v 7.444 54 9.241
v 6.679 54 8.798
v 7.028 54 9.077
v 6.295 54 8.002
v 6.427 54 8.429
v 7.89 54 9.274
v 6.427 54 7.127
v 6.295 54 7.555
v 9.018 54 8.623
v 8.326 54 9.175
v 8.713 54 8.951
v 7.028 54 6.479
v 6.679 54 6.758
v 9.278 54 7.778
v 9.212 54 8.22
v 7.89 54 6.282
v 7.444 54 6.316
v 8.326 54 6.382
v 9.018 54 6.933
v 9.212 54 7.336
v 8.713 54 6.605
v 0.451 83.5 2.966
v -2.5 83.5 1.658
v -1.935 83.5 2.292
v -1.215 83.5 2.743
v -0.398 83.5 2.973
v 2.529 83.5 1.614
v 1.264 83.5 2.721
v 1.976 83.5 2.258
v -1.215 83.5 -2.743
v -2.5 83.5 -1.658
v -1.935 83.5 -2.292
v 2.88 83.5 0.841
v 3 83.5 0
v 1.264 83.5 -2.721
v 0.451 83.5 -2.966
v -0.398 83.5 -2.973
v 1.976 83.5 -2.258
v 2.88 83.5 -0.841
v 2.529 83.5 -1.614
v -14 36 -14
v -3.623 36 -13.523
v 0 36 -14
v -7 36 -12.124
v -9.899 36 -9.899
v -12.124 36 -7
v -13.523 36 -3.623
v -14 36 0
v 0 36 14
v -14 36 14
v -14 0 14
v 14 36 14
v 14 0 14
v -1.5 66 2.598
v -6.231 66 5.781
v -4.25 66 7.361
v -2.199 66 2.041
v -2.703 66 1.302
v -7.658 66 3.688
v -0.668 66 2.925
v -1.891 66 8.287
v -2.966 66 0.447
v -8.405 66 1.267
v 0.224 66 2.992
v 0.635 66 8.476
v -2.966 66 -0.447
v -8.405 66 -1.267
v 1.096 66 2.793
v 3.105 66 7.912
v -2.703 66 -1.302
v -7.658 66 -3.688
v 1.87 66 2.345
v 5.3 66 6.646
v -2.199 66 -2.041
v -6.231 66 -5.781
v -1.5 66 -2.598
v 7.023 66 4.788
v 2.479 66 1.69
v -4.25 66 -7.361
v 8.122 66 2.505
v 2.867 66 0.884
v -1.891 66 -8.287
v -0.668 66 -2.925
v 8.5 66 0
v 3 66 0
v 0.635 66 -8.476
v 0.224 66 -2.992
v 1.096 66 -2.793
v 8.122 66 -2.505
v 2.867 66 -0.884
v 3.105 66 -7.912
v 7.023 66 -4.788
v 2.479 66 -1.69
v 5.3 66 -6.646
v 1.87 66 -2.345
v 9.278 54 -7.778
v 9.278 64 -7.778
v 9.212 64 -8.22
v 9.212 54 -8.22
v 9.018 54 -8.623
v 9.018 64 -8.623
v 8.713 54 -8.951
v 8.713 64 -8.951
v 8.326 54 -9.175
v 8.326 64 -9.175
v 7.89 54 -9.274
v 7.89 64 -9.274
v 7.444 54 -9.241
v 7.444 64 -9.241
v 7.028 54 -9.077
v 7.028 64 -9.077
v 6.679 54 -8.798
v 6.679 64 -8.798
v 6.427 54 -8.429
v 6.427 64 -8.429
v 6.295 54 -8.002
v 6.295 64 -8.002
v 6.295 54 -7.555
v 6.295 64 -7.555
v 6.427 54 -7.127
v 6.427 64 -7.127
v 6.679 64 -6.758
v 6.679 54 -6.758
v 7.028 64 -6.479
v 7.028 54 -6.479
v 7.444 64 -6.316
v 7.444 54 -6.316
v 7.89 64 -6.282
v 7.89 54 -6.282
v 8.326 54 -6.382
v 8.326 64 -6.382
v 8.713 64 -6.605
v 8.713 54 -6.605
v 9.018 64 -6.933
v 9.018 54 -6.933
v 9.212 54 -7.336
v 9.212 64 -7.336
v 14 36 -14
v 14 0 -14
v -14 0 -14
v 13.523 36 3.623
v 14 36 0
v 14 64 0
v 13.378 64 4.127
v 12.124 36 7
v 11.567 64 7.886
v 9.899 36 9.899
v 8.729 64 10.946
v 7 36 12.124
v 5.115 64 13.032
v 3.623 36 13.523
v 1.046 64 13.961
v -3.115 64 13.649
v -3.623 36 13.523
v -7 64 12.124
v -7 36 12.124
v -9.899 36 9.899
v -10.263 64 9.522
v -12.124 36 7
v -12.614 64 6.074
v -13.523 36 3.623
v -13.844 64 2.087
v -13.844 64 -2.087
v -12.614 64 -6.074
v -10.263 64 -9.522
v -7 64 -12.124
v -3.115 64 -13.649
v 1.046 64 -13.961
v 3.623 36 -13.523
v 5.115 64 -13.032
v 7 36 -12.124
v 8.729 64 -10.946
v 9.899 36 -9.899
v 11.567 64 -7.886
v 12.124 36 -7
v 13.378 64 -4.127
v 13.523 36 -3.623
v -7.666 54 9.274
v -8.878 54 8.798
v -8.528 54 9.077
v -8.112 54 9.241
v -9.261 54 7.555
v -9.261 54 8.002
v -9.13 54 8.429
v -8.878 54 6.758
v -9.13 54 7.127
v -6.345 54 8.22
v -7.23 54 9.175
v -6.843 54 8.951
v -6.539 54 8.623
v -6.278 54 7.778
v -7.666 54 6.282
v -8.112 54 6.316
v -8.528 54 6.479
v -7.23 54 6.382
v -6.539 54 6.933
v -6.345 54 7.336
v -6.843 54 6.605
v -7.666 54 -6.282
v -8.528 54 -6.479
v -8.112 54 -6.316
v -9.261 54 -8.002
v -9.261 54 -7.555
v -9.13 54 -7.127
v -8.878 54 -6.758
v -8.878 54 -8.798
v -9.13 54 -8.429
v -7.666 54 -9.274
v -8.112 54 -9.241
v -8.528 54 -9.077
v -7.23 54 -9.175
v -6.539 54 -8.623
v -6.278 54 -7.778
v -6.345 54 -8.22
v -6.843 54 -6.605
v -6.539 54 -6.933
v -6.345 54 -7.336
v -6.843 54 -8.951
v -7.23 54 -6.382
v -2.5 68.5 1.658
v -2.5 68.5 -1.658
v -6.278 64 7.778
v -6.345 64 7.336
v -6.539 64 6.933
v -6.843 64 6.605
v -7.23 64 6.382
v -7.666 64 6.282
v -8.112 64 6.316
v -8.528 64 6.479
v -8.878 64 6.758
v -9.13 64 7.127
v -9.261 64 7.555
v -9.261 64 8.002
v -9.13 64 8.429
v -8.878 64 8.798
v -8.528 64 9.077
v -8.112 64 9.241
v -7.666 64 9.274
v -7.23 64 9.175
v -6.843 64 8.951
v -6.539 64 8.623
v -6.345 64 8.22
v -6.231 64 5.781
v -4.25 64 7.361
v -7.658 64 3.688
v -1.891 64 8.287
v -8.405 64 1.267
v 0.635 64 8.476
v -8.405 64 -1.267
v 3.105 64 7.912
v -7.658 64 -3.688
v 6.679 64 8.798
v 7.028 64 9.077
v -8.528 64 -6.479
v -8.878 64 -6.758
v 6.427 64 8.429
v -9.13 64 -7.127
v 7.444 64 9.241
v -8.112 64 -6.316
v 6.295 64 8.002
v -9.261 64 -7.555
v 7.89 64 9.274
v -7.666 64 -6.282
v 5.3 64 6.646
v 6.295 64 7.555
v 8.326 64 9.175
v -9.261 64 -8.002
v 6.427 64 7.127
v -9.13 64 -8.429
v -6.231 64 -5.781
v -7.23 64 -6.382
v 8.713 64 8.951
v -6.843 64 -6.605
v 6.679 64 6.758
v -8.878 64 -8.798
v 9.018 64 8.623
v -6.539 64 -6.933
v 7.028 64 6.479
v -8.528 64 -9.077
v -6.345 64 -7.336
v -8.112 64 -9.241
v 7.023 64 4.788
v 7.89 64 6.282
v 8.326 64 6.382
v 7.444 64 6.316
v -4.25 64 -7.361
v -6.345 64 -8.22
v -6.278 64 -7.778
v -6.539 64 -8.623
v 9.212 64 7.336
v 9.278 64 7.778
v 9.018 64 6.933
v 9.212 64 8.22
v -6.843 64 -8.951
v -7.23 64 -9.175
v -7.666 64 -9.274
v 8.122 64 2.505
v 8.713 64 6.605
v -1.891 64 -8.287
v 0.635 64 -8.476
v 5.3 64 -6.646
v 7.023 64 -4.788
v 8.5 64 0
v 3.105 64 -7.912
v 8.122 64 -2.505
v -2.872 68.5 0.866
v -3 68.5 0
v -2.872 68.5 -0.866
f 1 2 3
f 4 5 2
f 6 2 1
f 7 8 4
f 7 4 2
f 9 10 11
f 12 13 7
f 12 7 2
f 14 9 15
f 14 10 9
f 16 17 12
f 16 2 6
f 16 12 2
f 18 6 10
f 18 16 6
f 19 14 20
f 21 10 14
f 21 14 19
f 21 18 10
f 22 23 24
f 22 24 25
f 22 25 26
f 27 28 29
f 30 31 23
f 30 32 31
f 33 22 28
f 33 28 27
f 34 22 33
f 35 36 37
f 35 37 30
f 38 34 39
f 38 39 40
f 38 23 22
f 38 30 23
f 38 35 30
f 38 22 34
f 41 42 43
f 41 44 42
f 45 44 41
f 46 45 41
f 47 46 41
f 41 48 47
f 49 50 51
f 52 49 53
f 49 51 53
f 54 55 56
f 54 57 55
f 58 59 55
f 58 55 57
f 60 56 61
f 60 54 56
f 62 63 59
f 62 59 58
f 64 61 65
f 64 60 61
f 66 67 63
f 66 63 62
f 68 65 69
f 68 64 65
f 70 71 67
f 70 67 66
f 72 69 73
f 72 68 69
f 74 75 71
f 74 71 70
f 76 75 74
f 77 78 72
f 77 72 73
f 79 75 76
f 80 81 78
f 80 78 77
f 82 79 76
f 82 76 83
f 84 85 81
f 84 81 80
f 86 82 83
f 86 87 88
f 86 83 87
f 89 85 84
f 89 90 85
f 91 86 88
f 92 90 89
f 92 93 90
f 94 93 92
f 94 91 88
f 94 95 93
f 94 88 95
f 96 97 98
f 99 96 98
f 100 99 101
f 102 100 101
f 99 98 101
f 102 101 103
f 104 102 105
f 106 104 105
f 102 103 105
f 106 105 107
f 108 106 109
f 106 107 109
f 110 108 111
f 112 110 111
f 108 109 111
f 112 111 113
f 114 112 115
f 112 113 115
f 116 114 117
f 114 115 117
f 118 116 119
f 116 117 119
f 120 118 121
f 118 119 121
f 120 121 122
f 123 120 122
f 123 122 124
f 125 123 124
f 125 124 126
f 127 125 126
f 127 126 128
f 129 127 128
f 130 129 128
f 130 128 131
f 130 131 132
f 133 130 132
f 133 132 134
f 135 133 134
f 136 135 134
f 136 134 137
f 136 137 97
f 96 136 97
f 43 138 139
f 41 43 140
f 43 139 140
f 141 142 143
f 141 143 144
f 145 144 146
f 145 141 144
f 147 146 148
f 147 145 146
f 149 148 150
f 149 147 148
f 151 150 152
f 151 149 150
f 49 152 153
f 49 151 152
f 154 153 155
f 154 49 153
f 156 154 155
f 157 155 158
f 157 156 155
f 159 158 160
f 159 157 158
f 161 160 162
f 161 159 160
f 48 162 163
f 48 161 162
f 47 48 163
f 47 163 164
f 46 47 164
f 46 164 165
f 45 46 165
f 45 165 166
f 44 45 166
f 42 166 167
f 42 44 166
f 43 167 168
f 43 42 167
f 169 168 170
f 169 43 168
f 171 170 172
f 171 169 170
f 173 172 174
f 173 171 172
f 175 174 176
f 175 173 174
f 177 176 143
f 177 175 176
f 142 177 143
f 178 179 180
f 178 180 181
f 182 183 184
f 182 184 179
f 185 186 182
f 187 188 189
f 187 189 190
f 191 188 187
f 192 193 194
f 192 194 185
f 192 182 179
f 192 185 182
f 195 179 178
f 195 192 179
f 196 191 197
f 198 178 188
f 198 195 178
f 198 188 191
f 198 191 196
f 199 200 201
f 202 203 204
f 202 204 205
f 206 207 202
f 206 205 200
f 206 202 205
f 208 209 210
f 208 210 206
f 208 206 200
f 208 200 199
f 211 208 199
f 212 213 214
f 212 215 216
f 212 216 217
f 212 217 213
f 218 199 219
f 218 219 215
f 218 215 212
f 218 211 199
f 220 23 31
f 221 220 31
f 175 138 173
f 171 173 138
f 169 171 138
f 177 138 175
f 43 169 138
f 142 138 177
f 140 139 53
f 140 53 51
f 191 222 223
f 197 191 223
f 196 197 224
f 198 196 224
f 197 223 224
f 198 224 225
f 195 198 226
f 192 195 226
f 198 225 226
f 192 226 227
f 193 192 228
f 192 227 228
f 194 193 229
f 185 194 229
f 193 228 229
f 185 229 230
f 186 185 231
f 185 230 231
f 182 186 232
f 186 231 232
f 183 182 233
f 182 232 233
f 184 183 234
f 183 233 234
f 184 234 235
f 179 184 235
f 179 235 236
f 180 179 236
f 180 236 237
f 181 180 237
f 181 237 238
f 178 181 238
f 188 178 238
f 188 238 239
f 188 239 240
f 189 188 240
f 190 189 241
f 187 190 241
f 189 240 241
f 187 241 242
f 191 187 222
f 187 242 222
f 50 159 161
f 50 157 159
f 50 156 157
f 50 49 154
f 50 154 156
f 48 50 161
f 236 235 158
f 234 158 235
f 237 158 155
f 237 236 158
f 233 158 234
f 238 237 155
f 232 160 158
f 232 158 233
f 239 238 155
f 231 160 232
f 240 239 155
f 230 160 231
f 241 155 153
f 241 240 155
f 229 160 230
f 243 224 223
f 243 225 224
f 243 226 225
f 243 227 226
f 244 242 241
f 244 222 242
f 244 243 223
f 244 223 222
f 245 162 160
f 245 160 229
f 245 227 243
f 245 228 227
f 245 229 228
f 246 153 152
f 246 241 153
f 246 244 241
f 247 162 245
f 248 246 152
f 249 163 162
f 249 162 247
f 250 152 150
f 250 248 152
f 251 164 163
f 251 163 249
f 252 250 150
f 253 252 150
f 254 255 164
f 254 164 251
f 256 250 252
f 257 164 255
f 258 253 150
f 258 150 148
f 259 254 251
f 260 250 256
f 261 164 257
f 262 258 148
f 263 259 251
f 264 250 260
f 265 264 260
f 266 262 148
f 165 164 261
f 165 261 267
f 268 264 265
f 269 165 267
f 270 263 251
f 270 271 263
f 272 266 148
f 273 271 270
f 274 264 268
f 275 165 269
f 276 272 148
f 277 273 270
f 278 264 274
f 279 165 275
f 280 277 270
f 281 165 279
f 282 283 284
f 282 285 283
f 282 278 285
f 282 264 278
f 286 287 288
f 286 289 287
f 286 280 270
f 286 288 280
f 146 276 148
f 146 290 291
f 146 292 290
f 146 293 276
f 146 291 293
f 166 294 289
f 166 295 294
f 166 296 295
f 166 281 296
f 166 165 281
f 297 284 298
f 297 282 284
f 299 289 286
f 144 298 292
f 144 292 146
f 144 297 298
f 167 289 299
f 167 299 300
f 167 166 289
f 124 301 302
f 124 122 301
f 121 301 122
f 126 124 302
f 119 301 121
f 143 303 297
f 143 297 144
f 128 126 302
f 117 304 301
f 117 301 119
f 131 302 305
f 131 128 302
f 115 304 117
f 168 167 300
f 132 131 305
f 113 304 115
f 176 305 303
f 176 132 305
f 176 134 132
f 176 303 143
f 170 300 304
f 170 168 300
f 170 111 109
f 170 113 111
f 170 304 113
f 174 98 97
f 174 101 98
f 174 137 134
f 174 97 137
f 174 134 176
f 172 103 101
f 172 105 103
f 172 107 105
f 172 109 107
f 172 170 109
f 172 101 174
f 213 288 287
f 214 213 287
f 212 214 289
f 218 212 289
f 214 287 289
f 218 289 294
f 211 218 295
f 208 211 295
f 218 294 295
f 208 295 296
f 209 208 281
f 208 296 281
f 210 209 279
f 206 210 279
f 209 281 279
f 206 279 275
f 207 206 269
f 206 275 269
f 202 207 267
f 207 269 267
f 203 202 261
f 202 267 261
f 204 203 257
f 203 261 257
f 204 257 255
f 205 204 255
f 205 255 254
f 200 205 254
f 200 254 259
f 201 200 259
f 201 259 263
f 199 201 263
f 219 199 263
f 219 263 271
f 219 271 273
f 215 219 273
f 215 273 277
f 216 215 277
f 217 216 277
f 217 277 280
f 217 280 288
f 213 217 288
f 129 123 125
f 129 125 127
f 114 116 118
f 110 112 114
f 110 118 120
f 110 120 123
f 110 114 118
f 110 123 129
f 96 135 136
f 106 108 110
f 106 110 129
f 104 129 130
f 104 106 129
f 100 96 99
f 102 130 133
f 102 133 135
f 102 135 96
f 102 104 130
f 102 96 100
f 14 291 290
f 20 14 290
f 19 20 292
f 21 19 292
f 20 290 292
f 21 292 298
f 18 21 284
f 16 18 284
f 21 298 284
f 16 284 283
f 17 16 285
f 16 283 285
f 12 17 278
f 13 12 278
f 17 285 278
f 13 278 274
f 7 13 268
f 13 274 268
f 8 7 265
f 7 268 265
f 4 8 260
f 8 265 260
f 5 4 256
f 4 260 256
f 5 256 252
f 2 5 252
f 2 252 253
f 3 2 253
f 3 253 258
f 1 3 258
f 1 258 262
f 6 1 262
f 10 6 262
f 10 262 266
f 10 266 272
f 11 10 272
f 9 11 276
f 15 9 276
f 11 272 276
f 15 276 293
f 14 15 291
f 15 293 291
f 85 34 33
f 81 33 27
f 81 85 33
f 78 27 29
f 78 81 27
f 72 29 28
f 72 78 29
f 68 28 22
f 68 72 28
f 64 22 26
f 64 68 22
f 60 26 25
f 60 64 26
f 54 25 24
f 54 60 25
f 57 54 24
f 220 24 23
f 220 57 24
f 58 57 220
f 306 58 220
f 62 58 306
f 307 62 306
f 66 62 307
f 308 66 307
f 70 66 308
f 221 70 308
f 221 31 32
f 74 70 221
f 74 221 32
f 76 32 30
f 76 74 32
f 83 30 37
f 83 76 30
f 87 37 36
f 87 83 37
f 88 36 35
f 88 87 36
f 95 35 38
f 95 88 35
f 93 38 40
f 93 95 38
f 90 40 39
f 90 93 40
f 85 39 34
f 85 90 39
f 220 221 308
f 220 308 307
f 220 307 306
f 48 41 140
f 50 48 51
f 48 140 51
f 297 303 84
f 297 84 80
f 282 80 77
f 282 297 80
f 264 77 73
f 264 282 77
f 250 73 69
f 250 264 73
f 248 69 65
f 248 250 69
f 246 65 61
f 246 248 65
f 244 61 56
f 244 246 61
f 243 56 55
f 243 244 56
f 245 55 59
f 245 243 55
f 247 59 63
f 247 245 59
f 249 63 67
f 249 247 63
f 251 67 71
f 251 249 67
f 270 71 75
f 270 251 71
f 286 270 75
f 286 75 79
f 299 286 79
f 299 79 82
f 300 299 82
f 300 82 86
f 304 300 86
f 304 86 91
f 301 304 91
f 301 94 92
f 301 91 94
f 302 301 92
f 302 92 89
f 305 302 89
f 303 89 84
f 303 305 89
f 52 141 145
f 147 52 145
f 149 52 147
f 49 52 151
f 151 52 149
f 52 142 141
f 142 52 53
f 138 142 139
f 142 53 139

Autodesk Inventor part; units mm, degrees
ref_plane "YZ Plane" through (0, 0, 0) normal (1, 0, 0) x (0, 1, 0)
ref_plane "XZ Plane" through (0, 0, 0) normal (0, 1, 0) x (-1, 0, 0)
ref_plane "XY Plane" through (0, 0, 0) normal (0, 0, 1) x (1, 0, 0)
sketch "草圖1" plane through (0, 0, 0) normal (0, 1, 0) x (-1, 0, 0)
  line L0 (14, 14) -> (-14, 14)
  line L1 (-14, 14) -> (-14, -14)
  line L2 (-14, -14) -> (14, -14)
  line L3 (14, -14) -> (14, 14)
  line L4 (14, 14) -> (-14, -14) construction
  line L5 (-14, 14) -> (14, -14) construction
  point P0 (0, 0)
  dimension "d0" = 28
  dimension "d1" = 28
extrude "擠出1" add sketch "草圖1" along normal blind 36
sketch "草圖2" plane through (0, 36, 0) normal (0, 1, 0) x (1, 0, 0)
  circle A0 centre (0, 0) radius 14
extrude "擠出2" add sketch "草圖2" along normal blind 28
sketch "草圖3" plane through (0, 64, 0) normal (0, 1, 0) x (1, 0, 0)
  circle A0 centre (0, 0) radius 8.5
  dimension "d6" = 17
extrude "擠出3" add sketch "草圖3" along normal blind 2
sketch "草圖4" plane through (0, 66, 0) normal (0, 1, 0) x (1, 0, 0)
  circle A0 centre (0, 0) radius 3
  dimension "d9" = 6
extrude "擠出4" add sketch "草圖4" along normal blind 17.5
sketch "草圖5" plane through (0, 83.5, 0) normal (0, 1, 0) x (1, 0, 0)
  circle A0 centre (0, 0) radius 3 projected
  line L0 (-2.5, -1.6583) -> (-2.5, 1.6583)
  point P0 (3, 0)
  dimension "d13" = 5.5
extrude "擠出5" cut sketch "草圖5" against normal blind 15 contours L0 A0 picked at (-2.6056, 0.3442)
sketch "草圖6" plane through (0, 64, 0) normal (0, 1, 0) x (1, 0, 0)
  circle A0 centre (0, 0) radius 11 construction
  line L0 (0, 0) -> (0, 11) construction
  circle A1 centre (0, 0) radius 14 projected
  line L1 (14, 14) -> (0, 14) projected
  line L2 (-14, -14) -> (0, -14) projected
  line L3 (14, 14) -> (-14, -14) construction
  circle A2 centre (7.7782, 7.7782) radius 1.5
  circle A3 centre (-7.7782, 7.7782) radius 1.5
  circle A4 centre (-7.7782, -7.7782) radius 1.5
  circle A5 centre (7.7782, -7.7782) radius 1.5
  dimension "d16" = 22
  dimension "d24" = 3
  dimension "d27" = 360
extrude "擠出6" cut sketch "草圖6" against normal blind 10 contours A2 | A3 | A4 | A5
properties part number "28stepper27"
